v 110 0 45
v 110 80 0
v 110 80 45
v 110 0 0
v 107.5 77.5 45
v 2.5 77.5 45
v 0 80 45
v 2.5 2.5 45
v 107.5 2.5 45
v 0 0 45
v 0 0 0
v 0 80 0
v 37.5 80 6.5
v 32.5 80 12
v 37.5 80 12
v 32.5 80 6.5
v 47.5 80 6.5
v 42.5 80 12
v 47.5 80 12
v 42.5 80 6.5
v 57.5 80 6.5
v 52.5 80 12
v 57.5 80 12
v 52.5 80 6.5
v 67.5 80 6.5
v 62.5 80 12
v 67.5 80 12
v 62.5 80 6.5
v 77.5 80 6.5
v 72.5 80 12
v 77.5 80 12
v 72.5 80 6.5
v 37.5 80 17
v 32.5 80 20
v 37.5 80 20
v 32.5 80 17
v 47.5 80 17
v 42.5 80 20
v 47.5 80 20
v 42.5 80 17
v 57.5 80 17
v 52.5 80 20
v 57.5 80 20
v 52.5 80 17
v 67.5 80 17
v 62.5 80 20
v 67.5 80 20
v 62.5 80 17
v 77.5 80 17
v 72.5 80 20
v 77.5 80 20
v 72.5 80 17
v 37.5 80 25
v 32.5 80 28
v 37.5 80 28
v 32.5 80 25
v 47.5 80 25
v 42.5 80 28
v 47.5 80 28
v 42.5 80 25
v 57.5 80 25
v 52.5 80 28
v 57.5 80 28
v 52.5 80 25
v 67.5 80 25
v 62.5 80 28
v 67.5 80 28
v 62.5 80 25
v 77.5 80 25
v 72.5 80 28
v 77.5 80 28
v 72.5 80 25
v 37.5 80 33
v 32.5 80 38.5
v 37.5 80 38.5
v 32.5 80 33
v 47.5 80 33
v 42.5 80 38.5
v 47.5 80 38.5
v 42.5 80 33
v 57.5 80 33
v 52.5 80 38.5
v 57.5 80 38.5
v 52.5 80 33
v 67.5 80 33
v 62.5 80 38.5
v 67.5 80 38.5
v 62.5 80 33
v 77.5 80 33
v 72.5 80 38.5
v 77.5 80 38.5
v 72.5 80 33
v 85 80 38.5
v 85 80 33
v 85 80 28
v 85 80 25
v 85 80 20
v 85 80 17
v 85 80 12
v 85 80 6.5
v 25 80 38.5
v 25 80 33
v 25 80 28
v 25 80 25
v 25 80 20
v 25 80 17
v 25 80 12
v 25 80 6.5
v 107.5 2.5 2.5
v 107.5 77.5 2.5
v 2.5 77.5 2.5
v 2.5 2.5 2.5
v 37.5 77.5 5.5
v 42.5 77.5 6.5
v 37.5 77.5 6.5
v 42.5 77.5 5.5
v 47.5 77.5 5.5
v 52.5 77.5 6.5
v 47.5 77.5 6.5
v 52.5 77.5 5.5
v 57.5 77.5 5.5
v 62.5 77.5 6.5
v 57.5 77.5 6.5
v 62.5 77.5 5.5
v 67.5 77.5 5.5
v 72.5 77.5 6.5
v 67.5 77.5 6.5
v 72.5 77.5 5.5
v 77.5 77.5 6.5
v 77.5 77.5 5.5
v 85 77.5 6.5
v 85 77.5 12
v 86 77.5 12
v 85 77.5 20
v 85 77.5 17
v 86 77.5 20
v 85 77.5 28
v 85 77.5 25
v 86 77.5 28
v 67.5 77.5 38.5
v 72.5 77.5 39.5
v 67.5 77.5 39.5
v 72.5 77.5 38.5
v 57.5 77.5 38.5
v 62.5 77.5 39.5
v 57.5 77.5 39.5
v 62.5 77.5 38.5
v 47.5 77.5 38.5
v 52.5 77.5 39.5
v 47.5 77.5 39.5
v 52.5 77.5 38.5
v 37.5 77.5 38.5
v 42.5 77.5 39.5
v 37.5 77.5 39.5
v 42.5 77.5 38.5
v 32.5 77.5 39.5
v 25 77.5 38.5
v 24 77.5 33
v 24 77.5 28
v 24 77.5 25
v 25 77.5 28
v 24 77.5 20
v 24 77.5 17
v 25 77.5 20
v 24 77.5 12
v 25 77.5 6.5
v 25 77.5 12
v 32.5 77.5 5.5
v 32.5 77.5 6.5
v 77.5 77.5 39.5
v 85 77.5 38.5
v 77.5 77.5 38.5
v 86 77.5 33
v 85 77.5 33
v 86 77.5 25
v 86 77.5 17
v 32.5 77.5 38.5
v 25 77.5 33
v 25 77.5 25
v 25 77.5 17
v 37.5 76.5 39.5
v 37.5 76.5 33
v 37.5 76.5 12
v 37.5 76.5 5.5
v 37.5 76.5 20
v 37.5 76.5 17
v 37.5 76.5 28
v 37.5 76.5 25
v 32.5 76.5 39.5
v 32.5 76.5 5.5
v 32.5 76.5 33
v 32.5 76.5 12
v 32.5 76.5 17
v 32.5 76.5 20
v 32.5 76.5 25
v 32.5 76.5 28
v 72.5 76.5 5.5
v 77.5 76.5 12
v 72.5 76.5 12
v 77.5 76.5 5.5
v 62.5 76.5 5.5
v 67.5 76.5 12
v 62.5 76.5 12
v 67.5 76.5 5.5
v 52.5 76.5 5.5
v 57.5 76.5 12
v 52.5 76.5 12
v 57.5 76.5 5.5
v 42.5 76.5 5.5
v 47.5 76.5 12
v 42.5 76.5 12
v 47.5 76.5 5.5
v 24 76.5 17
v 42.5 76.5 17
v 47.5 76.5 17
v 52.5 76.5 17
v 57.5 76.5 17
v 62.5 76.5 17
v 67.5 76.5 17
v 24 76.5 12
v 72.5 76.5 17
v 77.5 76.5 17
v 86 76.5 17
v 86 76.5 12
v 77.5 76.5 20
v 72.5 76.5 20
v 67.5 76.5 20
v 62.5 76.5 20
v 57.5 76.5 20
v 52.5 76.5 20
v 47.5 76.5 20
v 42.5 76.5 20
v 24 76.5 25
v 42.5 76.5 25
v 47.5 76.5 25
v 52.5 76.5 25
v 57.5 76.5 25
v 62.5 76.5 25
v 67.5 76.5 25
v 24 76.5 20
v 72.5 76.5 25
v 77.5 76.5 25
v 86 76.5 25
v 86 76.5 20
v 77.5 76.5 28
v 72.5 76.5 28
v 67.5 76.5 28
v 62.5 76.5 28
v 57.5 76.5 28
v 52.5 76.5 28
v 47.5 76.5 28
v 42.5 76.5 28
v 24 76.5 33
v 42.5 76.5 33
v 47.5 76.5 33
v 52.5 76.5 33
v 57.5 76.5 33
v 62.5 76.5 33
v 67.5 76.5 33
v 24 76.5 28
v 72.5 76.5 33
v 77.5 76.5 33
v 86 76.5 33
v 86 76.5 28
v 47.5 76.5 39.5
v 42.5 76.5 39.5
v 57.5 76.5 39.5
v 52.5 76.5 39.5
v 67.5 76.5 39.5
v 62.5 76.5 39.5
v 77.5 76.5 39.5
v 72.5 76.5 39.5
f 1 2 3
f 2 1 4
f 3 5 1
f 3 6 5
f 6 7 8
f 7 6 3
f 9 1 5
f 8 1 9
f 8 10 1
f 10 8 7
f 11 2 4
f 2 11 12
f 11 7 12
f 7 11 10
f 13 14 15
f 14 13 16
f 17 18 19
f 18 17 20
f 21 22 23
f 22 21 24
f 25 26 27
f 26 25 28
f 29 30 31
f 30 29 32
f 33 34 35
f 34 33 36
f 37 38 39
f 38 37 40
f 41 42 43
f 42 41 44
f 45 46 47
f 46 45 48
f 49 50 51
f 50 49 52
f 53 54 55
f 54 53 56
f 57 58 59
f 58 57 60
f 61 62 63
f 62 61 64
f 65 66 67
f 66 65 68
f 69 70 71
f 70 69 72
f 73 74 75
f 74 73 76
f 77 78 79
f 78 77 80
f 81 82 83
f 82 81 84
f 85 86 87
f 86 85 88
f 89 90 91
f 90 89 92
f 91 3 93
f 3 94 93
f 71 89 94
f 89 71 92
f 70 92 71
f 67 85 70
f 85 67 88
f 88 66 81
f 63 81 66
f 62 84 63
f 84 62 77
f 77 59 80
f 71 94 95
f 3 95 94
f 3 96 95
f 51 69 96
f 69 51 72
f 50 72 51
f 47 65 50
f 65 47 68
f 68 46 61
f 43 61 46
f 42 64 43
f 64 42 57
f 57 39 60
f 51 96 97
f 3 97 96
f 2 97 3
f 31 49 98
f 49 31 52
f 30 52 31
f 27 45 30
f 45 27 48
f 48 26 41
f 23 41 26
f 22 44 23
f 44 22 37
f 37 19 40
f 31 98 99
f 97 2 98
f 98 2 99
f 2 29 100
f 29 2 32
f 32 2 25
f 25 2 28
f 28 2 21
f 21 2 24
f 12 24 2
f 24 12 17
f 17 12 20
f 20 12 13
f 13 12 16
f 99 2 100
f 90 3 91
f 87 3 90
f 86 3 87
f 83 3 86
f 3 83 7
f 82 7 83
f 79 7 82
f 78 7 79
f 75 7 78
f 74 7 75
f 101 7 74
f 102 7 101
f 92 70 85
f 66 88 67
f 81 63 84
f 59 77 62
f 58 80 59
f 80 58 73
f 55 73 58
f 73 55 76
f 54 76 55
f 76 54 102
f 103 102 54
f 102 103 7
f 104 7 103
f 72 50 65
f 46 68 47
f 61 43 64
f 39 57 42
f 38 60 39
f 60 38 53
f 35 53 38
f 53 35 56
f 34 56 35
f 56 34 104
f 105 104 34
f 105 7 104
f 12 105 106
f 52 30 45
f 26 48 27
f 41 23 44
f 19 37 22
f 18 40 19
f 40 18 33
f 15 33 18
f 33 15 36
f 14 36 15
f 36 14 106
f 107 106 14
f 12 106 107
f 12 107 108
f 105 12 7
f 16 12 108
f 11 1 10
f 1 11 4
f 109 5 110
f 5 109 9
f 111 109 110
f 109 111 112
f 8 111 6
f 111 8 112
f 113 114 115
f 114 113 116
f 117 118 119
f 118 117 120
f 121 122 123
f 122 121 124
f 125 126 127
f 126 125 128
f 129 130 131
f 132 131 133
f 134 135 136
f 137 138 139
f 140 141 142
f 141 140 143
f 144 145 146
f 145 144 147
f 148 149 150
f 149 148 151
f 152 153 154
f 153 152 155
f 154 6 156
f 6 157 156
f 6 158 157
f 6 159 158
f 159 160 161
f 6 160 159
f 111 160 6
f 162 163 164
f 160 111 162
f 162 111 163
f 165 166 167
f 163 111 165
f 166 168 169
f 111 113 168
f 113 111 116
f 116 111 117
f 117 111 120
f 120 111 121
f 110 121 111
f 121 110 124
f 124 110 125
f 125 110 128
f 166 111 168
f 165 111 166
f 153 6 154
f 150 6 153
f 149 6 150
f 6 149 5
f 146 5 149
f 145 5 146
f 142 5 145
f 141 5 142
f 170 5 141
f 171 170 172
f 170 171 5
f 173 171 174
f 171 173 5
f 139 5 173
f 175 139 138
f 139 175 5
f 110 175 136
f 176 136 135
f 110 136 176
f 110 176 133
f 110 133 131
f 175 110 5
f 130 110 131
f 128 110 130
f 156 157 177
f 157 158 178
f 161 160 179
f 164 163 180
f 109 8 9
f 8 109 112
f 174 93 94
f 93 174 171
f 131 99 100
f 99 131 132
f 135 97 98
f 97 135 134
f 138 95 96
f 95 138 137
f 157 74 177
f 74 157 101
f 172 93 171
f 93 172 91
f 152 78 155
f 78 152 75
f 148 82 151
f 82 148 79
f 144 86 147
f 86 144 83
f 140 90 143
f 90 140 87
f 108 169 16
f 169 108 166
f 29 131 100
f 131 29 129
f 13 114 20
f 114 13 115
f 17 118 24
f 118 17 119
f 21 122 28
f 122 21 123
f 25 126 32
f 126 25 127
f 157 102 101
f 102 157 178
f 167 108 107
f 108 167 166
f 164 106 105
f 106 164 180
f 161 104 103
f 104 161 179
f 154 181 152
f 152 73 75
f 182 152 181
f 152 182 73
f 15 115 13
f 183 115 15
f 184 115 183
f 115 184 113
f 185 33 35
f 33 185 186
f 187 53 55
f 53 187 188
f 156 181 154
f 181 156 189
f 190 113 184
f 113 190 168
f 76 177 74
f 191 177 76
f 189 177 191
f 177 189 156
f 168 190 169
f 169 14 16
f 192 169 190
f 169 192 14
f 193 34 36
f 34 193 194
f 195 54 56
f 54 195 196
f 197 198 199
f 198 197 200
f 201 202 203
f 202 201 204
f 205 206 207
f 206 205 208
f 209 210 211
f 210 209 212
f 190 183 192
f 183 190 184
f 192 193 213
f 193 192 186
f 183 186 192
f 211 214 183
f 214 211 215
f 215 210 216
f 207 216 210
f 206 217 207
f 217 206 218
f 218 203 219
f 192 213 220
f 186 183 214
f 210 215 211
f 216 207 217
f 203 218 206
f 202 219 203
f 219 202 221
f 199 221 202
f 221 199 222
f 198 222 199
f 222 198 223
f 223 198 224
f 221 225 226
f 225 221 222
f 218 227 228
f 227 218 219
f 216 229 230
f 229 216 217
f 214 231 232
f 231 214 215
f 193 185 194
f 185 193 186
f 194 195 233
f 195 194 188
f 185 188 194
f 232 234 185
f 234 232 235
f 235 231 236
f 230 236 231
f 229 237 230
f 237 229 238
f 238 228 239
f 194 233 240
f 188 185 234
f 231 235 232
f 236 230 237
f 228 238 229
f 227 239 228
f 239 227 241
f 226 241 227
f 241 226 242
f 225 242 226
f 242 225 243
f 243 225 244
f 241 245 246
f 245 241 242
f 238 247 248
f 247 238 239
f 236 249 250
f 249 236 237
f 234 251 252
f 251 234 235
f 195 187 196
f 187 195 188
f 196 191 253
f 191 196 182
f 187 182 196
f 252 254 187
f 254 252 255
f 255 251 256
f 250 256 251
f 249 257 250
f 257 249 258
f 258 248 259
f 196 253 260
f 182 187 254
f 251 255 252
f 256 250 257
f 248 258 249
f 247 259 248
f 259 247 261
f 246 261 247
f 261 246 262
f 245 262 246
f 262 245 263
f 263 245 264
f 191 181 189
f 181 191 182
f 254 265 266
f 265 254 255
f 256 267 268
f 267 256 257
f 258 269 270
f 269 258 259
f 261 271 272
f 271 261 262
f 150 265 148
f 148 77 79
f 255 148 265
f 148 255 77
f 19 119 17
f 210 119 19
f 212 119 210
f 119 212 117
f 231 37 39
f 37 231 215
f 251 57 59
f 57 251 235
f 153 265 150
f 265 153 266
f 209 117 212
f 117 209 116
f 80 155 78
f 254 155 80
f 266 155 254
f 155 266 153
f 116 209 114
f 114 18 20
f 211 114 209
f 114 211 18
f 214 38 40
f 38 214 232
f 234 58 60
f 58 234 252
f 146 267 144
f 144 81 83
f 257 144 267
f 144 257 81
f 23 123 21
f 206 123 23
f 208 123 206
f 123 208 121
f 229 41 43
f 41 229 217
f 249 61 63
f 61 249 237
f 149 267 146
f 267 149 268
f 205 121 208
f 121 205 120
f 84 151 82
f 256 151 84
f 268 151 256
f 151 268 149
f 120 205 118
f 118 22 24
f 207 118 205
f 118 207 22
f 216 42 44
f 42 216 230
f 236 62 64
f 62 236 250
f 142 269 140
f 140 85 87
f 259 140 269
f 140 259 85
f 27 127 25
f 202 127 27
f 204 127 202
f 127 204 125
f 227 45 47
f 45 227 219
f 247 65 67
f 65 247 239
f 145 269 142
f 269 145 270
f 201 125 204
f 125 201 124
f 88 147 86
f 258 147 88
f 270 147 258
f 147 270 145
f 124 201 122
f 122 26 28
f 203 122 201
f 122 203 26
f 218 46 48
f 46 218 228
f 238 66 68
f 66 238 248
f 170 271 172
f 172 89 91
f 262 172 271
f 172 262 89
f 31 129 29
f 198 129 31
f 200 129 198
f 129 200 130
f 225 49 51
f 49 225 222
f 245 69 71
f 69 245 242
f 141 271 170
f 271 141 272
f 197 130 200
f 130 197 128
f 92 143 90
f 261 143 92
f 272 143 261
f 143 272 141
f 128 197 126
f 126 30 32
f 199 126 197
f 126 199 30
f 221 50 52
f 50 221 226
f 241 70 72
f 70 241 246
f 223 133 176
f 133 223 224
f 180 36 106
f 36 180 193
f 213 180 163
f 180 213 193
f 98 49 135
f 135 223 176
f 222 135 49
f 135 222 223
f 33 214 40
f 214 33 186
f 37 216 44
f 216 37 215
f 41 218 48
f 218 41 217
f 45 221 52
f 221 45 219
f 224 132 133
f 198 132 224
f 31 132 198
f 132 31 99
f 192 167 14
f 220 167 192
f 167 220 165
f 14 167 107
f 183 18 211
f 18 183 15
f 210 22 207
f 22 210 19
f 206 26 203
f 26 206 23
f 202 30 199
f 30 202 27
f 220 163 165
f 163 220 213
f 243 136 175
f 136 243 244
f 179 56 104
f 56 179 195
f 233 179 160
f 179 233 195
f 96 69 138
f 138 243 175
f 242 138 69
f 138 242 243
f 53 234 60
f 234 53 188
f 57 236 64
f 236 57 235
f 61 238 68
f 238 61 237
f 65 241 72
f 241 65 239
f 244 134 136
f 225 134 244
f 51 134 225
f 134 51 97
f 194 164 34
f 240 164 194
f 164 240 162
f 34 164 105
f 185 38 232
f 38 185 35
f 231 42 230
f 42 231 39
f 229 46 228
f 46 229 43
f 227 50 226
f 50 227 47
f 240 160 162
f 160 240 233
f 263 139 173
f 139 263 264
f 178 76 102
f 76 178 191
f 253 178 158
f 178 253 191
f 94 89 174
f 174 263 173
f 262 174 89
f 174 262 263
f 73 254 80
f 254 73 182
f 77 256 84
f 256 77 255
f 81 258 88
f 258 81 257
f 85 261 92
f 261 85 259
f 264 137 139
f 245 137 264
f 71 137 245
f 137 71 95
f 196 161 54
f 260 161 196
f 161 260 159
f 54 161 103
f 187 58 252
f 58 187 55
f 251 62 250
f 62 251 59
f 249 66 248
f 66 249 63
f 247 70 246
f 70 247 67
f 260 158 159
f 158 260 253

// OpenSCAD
$fn = 32;

// ----------------------------------------------------------------------
// Vent box: crossgrid enclosure
// ----------------------------------------------------------------------

// --- parameters (mm) ---
box_l = 110;              // box length, X
box_w = 80;               // box width, Y
box_h = 45;               // box height, Z
wall_t = 2.5;             // shell wall thickness
win_l = 60;               // vent window width, X
win_h = 32;               // vent window height, Z
bar_w = 5;                // grid bar width
n_v = 5;                  // vertical bar count
n_h = 3;                  // horizontal bar count

win_z0 = (box_h - win_h) / 2;  // window lower edge Z
v_step = win_l / (n_v + 1);  // vertical bar step
h_step = win_h / (n_h + 1);  // horizontal bar step

difference() {
  union() {
    difference() {
      cube([box_l, box_w, box_h]);
  translate([wall_t, wall_t, wall_t])
    cube([box_l - 2 * wall_t, box_w - 2 * wall_t, box_h]);
  translate([(box_l - win_l) / 2, box_w - wall_t - 1, win_z0])
    cube([win_l, wall_t + 2, win_h]);
    }
    for (i = [1 : n_v])
      translate([(box_l - win_l) / 2 + i * v_step - bar_w / 2,
                 box_w - wall_t - 1, win_z0 - 1])
        cube([bar_w, wall_t + 1, win_h + 2]);
    for (i = [1 : n_h])
      translate([(box_l - win_l) / 2 - 1, box_w - wall_t - 1,
                 win_z0 + i * h_step - bar_w / 2])
        cube([win_l + 2, wall_t + 1, bar_w]);
  }
}
